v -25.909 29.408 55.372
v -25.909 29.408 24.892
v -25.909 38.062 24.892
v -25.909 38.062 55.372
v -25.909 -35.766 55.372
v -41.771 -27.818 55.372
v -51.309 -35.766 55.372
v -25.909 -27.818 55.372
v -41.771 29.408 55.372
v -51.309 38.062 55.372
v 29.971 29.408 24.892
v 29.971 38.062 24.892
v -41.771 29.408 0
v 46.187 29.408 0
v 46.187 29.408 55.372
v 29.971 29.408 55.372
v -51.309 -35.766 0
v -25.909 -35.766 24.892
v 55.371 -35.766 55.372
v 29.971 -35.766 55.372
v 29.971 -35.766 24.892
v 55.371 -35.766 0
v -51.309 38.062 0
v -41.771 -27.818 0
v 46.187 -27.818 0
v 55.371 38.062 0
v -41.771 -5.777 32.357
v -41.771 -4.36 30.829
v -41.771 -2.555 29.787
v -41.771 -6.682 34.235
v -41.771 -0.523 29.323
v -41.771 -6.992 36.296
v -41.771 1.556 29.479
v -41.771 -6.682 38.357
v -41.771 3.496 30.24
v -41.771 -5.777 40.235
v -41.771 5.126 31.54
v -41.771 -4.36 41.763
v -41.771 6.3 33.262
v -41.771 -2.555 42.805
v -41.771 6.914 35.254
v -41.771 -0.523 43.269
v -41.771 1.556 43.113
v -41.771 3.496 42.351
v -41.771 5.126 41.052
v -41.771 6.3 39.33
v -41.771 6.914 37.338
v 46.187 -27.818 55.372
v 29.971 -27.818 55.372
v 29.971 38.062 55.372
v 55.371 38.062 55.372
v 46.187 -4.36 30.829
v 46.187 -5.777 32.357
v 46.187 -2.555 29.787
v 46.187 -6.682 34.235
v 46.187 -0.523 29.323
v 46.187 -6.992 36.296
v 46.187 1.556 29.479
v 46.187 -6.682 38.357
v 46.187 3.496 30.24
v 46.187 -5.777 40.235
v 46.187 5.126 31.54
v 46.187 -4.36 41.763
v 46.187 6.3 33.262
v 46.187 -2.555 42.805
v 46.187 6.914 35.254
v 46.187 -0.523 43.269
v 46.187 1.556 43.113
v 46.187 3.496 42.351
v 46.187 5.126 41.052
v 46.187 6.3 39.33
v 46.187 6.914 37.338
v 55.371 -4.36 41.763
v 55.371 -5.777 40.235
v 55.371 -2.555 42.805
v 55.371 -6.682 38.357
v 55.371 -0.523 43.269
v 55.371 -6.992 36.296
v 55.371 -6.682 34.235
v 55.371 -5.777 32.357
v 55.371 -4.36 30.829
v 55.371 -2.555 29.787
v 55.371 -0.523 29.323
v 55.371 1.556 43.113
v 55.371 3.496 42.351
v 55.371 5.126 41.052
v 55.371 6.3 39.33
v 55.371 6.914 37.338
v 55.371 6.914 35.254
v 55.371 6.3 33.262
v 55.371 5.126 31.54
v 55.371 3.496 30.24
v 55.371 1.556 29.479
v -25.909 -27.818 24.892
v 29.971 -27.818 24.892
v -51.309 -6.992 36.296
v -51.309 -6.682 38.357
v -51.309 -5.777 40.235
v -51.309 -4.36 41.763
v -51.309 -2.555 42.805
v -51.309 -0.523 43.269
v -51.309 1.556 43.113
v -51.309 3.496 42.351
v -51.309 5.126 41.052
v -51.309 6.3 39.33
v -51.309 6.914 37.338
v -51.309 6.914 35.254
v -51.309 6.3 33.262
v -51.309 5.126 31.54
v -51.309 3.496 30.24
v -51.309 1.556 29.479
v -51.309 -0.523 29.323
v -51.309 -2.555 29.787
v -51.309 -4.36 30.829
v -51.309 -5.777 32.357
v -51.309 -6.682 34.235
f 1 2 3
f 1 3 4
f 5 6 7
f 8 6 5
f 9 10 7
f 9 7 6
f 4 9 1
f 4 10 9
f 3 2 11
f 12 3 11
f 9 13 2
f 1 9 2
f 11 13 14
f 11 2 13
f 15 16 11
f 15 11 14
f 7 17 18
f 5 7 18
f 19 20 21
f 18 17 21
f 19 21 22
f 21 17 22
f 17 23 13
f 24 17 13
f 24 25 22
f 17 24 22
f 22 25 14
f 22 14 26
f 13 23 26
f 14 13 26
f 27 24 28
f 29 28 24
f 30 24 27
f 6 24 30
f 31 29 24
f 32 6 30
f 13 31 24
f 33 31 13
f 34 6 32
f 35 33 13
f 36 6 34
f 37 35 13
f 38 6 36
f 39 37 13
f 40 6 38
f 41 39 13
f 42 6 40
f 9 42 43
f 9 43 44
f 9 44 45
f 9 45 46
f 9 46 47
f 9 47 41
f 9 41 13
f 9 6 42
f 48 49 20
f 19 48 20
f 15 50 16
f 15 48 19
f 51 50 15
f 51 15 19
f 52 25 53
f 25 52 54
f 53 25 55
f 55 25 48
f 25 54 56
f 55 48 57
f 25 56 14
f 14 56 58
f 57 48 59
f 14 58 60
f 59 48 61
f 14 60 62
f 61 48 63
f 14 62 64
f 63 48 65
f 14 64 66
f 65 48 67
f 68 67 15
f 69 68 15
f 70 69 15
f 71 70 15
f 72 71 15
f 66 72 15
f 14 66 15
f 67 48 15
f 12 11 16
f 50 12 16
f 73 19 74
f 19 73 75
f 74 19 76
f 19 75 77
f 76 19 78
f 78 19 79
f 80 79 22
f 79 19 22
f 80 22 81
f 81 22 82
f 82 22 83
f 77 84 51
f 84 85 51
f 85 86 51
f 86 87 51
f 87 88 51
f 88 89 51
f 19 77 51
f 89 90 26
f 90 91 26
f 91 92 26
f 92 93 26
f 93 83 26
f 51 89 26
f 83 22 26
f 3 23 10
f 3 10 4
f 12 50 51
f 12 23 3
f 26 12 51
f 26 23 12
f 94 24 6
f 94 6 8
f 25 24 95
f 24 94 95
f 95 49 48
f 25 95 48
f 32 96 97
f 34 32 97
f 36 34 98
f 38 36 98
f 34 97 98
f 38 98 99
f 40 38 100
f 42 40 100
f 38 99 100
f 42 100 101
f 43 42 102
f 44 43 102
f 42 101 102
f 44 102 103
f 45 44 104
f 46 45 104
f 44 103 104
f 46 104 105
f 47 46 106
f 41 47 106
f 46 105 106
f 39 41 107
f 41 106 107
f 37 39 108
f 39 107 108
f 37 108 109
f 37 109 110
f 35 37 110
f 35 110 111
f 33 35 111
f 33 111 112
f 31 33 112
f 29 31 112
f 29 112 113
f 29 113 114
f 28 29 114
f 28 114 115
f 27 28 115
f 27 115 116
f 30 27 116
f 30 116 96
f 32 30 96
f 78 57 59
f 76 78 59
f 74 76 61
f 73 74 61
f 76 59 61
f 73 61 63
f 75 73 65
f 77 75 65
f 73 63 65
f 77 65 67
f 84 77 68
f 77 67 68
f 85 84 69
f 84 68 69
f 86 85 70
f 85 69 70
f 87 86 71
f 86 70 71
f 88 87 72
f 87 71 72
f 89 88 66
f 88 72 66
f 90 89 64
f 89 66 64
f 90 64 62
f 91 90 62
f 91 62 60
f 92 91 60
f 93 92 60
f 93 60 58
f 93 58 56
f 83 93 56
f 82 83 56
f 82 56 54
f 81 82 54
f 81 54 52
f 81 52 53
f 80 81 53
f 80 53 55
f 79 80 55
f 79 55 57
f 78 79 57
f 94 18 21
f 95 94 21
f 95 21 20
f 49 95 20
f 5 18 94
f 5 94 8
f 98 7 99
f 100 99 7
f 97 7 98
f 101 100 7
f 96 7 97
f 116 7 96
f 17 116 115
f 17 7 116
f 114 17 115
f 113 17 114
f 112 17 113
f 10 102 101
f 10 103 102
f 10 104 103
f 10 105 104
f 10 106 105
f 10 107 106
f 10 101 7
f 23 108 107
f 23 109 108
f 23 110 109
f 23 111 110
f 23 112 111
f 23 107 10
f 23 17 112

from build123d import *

# Parameters (mm, degrees)
F0_W     = 106.6799983382
F0_H     = 73.8282129169
F1_DEPTH = 55.372
F2_W     = 87.9580117762
F2_H     = 57.2256948799
F3_DEPTH = 57.15
F4_W     = 55.8799983382
F4_H     = 30.48
F5_DEPTH = 75.438
F6_R     = 6.9922217865
F7_DEPTH = 111.252


with BuildPart() as f1:
    # F0 (on Top) → F1 (new body)
    with BuildSketch(Plane.XY):
        with Locations((2.0311586559, 1.148045063)):
            Rectangle(F0_W, F0_H)
    extrude(amount=F1_DEPTH)

    # F2 (on face) → F3 (cut)
    with BuildSketch(Plane.XY.offset(55.372)):
        with Locations((2.2077802569, 0.7948009297)):
            Rectangle(F2_W, F2_H)
    extrude(amount=-F3_DEPTH, mode=Mode.SUBTRACT)

    # F4 (on face) → F5 (cut)
    with BuildSketch(Plane.XZ.offset(35.7660613954)):
        with Locations((2.0311586559, 40.132)):
            Rectangle(F4_W, F4_H)
    extrude(amount=-F5_DEPTH, mode=Mode.SUBTRACT)

    # F6 (on face) → F7 (cut)
    with BuildSketch(Plane(origin=(-51.3088405132, 0, 0), x_dir=(0, -1, 0), z_dir=(-1, 0, 0))):
        with Locations((0, 36.295928061)):
            Circle(F6_R)
    extrude(amount=-F7_DEPTH, mode=Mode.SUBTRACT)


solid = f1.part
